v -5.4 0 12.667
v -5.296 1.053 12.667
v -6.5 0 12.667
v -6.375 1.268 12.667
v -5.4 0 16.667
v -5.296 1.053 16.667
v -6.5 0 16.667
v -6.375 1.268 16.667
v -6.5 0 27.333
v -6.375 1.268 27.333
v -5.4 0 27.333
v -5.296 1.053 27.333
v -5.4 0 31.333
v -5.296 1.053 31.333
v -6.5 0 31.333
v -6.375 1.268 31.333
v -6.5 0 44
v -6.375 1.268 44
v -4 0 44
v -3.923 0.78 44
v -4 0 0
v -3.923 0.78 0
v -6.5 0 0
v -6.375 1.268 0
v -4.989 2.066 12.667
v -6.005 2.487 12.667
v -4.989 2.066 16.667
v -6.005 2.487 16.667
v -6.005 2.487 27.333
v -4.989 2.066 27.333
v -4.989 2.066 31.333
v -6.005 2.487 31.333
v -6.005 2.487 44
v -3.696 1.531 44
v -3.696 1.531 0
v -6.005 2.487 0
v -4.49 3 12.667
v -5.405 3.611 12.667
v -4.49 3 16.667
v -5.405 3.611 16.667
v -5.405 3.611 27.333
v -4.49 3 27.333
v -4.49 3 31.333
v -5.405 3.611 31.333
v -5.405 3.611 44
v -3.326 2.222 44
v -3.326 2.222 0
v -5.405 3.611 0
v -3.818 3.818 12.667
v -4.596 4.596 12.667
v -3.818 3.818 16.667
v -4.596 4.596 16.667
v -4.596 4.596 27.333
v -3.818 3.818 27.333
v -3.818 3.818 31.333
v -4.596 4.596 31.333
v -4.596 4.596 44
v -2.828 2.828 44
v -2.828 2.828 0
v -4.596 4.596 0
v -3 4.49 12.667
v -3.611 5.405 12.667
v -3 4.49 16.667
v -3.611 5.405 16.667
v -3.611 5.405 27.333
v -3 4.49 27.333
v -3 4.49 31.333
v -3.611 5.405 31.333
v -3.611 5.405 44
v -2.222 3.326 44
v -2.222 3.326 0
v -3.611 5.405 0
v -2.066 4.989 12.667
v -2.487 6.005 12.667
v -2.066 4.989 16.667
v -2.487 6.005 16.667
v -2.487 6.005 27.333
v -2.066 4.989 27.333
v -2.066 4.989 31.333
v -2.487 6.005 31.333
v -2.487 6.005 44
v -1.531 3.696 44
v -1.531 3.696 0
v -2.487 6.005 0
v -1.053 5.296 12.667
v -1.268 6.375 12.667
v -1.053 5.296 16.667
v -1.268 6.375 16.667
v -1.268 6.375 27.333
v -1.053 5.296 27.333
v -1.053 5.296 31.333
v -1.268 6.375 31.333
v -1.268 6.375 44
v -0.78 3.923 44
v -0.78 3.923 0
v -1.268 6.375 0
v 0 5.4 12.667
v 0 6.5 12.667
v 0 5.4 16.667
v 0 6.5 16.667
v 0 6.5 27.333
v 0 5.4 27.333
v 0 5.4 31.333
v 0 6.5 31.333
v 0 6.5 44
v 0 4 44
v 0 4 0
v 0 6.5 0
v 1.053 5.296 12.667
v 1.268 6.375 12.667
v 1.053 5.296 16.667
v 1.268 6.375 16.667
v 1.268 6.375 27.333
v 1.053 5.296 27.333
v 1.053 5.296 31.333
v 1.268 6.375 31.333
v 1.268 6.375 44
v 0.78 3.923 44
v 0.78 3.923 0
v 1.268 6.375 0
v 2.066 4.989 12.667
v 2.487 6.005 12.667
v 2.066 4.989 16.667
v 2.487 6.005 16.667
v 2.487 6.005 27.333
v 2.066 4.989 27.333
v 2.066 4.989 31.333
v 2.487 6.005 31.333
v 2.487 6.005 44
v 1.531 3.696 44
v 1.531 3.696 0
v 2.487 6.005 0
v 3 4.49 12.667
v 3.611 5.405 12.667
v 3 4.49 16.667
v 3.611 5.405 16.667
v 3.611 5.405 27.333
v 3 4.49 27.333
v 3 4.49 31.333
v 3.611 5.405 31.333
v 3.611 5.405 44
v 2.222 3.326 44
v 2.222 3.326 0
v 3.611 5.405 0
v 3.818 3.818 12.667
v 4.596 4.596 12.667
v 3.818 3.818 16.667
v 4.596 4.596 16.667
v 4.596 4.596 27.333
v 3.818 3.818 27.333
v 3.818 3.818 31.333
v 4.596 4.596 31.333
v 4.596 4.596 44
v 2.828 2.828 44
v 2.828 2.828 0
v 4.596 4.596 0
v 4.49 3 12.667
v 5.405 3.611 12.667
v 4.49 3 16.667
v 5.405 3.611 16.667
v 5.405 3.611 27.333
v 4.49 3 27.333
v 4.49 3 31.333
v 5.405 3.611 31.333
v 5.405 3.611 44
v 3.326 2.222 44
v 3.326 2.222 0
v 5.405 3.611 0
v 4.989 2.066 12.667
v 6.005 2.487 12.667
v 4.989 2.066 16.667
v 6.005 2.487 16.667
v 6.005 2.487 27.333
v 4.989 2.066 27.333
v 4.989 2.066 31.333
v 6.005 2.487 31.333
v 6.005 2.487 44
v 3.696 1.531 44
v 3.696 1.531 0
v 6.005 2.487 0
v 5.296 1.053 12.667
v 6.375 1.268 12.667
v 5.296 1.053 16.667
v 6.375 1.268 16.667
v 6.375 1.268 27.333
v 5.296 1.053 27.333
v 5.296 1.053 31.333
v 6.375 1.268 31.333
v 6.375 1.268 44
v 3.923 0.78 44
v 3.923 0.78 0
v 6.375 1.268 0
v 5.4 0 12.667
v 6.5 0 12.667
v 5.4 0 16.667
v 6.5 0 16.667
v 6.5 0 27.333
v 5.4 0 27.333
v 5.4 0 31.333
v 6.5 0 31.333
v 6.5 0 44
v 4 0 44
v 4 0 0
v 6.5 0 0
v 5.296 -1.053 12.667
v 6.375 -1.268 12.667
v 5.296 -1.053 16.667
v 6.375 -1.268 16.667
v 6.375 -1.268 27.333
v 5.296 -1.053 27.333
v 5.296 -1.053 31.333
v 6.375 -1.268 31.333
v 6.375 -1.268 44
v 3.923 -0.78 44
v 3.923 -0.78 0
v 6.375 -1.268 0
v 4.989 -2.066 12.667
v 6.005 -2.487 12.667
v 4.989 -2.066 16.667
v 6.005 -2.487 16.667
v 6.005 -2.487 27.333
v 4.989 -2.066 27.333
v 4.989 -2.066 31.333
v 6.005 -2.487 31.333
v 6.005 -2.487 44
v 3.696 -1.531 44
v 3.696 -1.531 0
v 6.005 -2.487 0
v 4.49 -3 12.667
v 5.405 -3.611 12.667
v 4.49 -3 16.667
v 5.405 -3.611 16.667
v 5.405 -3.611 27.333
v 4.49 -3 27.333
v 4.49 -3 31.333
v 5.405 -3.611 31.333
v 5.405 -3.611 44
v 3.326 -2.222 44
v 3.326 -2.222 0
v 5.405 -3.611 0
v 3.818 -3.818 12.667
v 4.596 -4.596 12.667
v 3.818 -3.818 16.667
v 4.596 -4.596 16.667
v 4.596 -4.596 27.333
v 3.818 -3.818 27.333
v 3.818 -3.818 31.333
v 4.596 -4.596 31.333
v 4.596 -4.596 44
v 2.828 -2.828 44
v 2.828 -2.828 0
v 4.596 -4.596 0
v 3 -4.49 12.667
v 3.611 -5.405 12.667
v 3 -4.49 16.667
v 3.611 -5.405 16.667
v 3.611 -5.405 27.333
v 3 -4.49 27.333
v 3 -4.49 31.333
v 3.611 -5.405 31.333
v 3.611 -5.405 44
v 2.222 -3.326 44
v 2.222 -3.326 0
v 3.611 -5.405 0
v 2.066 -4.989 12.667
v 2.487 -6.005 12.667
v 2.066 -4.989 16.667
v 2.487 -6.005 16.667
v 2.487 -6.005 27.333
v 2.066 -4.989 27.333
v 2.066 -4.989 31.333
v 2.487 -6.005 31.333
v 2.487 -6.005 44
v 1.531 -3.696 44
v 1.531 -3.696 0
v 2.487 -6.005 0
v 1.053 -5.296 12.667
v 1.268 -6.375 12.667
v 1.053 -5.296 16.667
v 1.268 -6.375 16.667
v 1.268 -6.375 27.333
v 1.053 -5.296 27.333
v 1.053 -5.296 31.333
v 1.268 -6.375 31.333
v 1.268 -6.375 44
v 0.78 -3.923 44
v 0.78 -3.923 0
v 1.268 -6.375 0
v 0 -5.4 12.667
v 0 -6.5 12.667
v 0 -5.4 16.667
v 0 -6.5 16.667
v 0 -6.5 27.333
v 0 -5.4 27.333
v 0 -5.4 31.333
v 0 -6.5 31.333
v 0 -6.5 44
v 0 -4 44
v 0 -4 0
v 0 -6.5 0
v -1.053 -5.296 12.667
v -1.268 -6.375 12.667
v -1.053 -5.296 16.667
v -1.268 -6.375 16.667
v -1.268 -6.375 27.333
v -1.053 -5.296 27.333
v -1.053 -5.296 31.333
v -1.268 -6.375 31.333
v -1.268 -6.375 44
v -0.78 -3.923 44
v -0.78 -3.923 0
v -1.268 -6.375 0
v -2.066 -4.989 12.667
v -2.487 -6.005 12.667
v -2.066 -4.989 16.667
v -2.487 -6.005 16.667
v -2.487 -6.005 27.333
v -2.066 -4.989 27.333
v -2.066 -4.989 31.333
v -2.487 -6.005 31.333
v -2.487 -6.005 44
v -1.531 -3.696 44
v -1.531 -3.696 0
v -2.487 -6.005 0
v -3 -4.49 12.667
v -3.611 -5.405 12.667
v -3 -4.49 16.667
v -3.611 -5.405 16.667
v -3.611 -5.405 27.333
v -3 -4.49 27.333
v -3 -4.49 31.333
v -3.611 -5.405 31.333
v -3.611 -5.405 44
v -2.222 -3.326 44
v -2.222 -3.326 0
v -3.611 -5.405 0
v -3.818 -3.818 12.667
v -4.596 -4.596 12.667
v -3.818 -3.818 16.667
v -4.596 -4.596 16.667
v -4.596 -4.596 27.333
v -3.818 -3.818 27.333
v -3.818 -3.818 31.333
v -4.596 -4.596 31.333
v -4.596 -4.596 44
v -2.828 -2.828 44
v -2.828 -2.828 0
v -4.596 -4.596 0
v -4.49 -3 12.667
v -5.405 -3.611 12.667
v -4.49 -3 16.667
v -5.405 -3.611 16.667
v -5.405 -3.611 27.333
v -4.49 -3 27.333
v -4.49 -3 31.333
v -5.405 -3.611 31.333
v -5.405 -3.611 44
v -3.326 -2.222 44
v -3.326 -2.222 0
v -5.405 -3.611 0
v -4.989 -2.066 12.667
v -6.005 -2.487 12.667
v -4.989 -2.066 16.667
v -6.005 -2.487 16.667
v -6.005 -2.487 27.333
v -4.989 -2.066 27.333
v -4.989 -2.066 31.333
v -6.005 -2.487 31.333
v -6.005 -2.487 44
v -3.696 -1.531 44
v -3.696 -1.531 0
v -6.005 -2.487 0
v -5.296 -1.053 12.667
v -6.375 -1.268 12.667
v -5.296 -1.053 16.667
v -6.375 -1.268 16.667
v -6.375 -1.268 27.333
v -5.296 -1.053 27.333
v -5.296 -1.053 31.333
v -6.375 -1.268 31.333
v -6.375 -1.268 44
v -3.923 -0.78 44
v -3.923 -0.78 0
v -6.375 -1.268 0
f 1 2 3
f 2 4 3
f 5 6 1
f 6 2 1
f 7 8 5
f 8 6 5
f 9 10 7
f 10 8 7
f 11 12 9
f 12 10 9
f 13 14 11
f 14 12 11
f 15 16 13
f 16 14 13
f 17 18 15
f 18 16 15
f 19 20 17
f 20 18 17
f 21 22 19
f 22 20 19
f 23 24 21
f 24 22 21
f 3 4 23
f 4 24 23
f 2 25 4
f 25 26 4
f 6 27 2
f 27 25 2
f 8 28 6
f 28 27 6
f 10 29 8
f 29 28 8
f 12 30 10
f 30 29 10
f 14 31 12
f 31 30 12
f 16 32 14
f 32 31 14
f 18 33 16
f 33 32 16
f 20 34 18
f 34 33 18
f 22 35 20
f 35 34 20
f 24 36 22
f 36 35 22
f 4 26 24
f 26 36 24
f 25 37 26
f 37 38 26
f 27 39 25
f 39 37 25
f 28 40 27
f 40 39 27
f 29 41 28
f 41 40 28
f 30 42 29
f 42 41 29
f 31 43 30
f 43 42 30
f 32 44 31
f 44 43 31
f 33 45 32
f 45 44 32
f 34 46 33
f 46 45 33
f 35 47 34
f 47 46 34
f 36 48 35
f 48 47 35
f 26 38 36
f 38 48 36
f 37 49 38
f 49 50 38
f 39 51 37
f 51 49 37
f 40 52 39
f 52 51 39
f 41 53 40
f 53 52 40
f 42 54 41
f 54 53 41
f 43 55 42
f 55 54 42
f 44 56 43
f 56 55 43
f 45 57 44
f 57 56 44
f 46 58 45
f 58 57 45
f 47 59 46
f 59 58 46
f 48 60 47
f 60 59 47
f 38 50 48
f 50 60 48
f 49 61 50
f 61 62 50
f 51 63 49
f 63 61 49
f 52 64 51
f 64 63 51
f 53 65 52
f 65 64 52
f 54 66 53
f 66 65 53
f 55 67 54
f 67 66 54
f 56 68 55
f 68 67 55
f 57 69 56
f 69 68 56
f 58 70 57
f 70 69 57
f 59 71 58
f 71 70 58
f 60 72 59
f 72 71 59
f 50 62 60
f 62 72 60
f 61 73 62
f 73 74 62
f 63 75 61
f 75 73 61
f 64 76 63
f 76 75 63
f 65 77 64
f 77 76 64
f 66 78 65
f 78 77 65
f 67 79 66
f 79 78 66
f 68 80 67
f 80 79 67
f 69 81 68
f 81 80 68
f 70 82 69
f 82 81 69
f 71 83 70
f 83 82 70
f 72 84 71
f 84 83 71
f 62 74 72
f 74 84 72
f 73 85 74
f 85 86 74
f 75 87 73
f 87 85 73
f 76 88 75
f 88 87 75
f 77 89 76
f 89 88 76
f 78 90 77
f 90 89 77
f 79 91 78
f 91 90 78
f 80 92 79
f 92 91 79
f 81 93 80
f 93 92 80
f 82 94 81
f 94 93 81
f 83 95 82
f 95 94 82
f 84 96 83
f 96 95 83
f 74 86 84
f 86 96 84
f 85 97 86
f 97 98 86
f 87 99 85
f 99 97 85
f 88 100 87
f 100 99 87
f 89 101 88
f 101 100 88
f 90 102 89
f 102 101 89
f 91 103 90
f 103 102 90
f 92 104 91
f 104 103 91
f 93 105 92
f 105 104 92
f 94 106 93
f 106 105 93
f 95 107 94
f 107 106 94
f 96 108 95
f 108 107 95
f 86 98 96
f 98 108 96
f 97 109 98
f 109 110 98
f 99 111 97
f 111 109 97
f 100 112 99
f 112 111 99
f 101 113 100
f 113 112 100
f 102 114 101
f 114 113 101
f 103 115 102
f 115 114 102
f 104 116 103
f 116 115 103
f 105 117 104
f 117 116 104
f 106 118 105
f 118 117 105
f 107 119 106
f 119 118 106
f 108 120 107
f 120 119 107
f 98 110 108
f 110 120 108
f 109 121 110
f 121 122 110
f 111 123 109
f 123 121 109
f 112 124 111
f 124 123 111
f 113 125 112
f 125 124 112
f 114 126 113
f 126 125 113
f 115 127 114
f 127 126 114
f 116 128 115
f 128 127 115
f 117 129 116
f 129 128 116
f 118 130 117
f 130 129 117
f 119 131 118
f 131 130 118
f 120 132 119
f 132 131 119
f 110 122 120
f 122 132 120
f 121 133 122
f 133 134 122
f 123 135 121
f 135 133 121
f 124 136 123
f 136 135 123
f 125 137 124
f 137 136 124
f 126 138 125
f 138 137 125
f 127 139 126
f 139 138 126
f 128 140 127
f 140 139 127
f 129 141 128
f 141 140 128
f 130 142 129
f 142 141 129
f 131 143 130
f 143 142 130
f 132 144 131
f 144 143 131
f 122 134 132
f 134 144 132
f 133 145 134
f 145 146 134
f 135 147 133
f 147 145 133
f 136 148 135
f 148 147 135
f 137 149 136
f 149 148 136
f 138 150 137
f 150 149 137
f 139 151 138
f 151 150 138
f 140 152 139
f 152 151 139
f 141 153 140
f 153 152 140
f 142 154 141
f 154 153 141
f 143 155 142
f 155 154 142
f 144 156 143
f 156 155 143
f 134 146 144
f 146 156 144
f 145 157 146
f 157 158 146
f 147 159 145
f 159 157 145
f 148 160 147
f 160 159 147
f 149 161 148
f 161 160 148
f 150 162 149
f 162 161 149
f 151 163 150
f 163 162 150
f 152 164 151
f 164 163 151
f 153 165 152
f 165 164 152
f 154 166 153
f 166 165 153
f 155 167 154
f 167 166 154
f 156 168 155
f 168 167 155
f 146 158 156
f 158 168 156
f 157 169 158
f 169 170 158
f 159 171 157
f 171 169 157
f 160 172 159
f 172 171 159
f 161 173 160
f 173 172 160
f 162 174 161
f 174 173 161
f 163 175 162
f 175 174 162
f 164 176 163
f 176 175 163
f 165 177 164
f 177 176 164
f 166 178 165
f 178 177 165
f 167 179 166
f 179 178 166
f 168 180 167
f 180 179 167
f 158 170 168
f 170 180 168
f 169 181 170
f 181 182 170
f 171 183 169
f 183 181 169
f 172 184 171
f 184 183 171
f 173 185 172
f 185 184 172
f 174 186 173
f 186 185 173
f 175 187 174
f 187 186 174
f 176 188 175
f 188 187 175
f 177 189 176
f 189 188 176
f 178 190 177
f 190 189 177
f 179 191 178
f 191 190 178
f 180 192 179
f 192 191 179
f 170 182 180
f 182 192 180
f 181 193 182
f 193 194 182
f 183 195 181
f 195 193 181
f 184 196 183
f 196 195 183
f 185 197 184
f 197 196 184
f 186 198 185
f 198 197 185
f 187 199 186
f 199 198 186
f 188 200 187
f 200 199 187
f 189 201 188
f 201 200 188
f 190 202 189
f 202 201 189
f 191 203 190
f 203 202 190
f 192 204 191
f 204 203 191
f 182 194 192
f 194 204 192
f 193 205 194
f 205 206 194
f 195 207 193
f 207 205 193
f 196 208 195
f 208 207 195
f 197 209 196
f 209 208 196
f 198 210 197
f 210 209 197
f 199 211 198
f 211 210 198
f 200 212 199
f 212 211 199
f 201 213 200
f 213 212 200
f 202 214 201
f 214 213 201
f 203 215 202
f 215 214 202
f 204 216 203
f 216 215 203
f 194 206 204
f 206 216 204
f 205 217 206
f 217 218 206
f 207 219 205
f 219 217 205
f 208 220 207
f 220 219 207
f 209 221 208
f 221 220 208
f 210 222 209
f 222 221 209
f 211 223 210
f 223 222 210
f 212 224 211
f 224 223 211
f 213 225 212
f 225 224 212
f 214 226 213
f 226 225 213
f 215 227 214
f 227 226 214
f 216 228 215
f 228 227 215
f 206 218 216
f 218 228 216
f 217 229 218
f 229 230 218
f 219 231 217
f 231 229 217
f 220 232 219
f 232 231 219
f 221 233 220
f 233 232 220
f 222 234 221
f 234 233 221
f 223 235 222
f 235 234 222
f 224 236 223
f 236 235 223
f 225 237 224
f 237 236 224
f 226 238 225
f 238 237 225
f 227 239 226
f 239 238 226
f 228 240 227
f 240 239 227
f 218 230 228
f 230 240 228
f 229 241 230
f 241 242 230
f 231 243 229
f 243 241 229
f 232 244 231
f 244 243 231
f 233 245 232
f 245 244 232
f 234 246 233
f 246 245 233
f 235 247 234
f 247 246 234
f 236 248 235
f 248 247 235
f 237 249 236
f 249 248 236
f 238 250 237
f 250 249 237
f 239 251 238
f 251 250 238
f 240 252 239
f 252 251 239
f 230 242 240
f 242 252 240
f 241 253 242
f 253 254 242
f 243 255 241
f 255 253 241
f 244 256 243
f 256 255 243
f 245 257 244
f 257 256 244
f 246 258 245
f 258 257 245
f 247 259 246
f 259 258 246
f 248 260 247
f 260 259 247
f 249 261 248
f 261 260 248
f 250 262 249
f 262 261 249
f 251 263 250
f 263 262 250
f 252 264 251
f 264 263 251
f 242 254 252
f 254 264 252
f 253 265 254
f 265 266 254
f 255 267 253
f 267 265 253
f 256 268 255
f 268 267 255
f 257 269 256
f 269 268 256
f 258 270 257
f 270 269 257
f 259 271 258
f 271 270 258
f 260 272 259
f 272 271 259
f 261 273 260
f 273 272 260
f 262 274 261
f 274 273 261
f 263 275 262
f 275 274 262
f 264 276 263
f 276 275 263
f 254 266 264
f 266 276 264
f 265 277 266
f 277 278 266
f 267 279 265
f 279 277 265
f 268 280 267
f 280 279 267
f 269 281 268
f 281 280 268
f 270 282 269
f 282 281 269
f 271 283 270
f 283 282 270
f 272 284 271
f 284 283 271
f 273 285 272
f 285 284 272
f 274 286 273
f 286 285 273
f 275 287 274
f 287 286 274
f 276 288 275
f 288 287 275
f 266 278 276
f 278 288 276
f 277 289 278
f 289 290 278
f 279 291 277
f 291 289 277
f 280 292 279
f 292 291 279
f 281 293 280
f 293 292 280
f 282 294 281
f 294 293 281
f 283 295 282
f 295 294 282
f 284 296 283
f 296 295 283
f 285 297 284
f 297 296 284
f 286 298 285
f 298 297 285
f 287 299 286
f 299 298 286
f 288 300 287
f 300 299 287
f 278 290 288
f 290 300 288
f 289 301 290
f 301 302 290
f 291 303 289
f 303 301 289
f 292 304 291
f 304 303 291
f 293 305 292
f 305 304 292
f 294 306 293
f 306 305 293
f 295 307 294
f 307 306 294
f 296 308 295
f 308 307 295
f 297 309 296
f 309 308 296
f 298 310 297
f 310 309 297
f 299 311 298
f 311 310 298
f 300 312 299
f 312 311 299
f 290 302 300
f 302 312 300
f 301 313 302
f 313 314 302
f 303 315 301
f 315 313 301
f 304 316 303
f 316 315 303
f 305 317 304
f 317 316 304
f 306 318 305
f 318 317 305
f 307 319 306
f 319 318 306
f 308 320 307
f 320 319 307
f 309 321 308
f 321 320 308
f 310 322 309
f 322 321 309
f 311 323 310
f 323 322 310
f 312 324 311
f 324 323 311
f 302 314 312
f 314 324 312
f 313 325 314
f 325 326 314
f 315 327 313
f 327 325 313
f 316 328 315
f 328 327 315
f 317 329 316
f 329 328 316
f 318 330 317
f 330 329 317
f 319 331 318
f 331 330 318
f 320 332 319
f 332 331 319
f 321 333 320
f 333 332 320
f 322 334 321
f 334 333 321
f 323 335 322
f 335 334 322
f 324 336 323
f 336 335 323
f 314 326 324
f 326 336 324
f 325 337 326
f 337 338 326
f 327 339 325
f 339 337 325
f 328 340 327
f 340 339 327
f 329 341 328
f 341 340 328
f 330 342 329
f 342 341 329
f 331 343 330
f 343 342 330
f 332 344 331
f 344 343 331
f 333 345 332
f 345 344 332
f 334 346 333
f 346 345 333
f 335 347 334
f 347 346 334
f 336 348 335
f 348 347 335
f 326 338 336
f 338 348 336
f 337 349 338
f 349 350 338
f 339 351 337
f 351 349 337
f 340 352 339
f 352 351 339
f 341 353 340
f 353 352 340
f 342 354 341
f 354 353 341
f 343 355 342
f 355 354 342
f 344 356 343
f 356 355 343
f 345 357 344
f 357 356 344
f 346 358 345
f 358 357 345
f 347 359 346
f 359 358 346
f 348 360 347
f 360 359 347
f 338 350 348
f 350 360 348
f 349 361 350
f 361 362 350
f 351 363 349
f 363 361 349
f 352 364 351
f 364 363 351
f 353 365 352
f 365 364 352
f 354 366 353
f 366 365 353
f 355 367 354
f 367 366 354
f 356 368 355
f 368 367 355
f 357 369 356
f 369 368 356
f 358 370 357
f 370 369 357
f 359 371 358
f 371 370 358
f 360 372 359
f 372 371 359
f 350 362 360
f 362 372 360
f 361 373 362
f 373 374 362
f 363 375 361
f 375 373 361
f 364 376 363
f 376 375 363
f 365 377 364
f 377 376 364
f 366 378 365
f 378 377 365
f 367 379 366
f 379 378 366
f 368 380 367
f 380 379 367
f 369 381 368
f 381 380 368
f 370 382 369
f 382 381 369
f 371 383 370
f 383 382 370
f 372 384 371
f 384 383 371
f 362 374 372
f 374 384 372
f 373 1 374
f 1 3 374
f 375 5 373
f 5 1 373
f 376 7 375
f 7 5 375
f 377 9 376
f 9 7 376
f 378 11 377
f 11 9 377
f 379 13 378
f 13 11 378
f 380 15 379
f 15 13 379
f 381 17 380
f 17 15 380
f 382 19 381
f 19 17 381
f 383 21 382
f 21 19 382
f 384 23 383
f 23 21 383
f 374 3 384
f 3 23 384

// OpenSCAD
$fn = 32;

// ----------------------------------------------------------------------
// Grooved revolve: plain_grooves, bore R4
// ----------------------------------------------------------------------

// --- parameters (mm) ---
bore_r = 4;               // bore radius
outer_r = 6.5;            // outer radius of the body
total_h = 44;             // overall height, Z
wall = 2.5;               // radial wall thickness
groove_w = 4;             // groove width
groove_d = 1.1;           // groove depth
grooves = 2;              // number of outer grooves

bbox_x = 2 * outer_r;  // full diameter
bore_d = 2 * bore_r;  // bore diameter
body_d = 2 * outer_r;  // body diameter
revolve_angle = 360;  // full turn around the Z axis

profile = [[4, 0], [6.5, 0], [6.5, 12.667], [5.4, 12.667], [5.4, 16.667], [6.5, 16.667], [6.5, 27.333], [5.4, 27.333], [5.4, 31.333], [6.5, 31.333], [6.5, 44], [4, 44]];  // primary outline, 12 points, counter clockwise

// --- the one profile operation ---
rotate_extrude(angle = revolve_angle) polygon(points = profile);
